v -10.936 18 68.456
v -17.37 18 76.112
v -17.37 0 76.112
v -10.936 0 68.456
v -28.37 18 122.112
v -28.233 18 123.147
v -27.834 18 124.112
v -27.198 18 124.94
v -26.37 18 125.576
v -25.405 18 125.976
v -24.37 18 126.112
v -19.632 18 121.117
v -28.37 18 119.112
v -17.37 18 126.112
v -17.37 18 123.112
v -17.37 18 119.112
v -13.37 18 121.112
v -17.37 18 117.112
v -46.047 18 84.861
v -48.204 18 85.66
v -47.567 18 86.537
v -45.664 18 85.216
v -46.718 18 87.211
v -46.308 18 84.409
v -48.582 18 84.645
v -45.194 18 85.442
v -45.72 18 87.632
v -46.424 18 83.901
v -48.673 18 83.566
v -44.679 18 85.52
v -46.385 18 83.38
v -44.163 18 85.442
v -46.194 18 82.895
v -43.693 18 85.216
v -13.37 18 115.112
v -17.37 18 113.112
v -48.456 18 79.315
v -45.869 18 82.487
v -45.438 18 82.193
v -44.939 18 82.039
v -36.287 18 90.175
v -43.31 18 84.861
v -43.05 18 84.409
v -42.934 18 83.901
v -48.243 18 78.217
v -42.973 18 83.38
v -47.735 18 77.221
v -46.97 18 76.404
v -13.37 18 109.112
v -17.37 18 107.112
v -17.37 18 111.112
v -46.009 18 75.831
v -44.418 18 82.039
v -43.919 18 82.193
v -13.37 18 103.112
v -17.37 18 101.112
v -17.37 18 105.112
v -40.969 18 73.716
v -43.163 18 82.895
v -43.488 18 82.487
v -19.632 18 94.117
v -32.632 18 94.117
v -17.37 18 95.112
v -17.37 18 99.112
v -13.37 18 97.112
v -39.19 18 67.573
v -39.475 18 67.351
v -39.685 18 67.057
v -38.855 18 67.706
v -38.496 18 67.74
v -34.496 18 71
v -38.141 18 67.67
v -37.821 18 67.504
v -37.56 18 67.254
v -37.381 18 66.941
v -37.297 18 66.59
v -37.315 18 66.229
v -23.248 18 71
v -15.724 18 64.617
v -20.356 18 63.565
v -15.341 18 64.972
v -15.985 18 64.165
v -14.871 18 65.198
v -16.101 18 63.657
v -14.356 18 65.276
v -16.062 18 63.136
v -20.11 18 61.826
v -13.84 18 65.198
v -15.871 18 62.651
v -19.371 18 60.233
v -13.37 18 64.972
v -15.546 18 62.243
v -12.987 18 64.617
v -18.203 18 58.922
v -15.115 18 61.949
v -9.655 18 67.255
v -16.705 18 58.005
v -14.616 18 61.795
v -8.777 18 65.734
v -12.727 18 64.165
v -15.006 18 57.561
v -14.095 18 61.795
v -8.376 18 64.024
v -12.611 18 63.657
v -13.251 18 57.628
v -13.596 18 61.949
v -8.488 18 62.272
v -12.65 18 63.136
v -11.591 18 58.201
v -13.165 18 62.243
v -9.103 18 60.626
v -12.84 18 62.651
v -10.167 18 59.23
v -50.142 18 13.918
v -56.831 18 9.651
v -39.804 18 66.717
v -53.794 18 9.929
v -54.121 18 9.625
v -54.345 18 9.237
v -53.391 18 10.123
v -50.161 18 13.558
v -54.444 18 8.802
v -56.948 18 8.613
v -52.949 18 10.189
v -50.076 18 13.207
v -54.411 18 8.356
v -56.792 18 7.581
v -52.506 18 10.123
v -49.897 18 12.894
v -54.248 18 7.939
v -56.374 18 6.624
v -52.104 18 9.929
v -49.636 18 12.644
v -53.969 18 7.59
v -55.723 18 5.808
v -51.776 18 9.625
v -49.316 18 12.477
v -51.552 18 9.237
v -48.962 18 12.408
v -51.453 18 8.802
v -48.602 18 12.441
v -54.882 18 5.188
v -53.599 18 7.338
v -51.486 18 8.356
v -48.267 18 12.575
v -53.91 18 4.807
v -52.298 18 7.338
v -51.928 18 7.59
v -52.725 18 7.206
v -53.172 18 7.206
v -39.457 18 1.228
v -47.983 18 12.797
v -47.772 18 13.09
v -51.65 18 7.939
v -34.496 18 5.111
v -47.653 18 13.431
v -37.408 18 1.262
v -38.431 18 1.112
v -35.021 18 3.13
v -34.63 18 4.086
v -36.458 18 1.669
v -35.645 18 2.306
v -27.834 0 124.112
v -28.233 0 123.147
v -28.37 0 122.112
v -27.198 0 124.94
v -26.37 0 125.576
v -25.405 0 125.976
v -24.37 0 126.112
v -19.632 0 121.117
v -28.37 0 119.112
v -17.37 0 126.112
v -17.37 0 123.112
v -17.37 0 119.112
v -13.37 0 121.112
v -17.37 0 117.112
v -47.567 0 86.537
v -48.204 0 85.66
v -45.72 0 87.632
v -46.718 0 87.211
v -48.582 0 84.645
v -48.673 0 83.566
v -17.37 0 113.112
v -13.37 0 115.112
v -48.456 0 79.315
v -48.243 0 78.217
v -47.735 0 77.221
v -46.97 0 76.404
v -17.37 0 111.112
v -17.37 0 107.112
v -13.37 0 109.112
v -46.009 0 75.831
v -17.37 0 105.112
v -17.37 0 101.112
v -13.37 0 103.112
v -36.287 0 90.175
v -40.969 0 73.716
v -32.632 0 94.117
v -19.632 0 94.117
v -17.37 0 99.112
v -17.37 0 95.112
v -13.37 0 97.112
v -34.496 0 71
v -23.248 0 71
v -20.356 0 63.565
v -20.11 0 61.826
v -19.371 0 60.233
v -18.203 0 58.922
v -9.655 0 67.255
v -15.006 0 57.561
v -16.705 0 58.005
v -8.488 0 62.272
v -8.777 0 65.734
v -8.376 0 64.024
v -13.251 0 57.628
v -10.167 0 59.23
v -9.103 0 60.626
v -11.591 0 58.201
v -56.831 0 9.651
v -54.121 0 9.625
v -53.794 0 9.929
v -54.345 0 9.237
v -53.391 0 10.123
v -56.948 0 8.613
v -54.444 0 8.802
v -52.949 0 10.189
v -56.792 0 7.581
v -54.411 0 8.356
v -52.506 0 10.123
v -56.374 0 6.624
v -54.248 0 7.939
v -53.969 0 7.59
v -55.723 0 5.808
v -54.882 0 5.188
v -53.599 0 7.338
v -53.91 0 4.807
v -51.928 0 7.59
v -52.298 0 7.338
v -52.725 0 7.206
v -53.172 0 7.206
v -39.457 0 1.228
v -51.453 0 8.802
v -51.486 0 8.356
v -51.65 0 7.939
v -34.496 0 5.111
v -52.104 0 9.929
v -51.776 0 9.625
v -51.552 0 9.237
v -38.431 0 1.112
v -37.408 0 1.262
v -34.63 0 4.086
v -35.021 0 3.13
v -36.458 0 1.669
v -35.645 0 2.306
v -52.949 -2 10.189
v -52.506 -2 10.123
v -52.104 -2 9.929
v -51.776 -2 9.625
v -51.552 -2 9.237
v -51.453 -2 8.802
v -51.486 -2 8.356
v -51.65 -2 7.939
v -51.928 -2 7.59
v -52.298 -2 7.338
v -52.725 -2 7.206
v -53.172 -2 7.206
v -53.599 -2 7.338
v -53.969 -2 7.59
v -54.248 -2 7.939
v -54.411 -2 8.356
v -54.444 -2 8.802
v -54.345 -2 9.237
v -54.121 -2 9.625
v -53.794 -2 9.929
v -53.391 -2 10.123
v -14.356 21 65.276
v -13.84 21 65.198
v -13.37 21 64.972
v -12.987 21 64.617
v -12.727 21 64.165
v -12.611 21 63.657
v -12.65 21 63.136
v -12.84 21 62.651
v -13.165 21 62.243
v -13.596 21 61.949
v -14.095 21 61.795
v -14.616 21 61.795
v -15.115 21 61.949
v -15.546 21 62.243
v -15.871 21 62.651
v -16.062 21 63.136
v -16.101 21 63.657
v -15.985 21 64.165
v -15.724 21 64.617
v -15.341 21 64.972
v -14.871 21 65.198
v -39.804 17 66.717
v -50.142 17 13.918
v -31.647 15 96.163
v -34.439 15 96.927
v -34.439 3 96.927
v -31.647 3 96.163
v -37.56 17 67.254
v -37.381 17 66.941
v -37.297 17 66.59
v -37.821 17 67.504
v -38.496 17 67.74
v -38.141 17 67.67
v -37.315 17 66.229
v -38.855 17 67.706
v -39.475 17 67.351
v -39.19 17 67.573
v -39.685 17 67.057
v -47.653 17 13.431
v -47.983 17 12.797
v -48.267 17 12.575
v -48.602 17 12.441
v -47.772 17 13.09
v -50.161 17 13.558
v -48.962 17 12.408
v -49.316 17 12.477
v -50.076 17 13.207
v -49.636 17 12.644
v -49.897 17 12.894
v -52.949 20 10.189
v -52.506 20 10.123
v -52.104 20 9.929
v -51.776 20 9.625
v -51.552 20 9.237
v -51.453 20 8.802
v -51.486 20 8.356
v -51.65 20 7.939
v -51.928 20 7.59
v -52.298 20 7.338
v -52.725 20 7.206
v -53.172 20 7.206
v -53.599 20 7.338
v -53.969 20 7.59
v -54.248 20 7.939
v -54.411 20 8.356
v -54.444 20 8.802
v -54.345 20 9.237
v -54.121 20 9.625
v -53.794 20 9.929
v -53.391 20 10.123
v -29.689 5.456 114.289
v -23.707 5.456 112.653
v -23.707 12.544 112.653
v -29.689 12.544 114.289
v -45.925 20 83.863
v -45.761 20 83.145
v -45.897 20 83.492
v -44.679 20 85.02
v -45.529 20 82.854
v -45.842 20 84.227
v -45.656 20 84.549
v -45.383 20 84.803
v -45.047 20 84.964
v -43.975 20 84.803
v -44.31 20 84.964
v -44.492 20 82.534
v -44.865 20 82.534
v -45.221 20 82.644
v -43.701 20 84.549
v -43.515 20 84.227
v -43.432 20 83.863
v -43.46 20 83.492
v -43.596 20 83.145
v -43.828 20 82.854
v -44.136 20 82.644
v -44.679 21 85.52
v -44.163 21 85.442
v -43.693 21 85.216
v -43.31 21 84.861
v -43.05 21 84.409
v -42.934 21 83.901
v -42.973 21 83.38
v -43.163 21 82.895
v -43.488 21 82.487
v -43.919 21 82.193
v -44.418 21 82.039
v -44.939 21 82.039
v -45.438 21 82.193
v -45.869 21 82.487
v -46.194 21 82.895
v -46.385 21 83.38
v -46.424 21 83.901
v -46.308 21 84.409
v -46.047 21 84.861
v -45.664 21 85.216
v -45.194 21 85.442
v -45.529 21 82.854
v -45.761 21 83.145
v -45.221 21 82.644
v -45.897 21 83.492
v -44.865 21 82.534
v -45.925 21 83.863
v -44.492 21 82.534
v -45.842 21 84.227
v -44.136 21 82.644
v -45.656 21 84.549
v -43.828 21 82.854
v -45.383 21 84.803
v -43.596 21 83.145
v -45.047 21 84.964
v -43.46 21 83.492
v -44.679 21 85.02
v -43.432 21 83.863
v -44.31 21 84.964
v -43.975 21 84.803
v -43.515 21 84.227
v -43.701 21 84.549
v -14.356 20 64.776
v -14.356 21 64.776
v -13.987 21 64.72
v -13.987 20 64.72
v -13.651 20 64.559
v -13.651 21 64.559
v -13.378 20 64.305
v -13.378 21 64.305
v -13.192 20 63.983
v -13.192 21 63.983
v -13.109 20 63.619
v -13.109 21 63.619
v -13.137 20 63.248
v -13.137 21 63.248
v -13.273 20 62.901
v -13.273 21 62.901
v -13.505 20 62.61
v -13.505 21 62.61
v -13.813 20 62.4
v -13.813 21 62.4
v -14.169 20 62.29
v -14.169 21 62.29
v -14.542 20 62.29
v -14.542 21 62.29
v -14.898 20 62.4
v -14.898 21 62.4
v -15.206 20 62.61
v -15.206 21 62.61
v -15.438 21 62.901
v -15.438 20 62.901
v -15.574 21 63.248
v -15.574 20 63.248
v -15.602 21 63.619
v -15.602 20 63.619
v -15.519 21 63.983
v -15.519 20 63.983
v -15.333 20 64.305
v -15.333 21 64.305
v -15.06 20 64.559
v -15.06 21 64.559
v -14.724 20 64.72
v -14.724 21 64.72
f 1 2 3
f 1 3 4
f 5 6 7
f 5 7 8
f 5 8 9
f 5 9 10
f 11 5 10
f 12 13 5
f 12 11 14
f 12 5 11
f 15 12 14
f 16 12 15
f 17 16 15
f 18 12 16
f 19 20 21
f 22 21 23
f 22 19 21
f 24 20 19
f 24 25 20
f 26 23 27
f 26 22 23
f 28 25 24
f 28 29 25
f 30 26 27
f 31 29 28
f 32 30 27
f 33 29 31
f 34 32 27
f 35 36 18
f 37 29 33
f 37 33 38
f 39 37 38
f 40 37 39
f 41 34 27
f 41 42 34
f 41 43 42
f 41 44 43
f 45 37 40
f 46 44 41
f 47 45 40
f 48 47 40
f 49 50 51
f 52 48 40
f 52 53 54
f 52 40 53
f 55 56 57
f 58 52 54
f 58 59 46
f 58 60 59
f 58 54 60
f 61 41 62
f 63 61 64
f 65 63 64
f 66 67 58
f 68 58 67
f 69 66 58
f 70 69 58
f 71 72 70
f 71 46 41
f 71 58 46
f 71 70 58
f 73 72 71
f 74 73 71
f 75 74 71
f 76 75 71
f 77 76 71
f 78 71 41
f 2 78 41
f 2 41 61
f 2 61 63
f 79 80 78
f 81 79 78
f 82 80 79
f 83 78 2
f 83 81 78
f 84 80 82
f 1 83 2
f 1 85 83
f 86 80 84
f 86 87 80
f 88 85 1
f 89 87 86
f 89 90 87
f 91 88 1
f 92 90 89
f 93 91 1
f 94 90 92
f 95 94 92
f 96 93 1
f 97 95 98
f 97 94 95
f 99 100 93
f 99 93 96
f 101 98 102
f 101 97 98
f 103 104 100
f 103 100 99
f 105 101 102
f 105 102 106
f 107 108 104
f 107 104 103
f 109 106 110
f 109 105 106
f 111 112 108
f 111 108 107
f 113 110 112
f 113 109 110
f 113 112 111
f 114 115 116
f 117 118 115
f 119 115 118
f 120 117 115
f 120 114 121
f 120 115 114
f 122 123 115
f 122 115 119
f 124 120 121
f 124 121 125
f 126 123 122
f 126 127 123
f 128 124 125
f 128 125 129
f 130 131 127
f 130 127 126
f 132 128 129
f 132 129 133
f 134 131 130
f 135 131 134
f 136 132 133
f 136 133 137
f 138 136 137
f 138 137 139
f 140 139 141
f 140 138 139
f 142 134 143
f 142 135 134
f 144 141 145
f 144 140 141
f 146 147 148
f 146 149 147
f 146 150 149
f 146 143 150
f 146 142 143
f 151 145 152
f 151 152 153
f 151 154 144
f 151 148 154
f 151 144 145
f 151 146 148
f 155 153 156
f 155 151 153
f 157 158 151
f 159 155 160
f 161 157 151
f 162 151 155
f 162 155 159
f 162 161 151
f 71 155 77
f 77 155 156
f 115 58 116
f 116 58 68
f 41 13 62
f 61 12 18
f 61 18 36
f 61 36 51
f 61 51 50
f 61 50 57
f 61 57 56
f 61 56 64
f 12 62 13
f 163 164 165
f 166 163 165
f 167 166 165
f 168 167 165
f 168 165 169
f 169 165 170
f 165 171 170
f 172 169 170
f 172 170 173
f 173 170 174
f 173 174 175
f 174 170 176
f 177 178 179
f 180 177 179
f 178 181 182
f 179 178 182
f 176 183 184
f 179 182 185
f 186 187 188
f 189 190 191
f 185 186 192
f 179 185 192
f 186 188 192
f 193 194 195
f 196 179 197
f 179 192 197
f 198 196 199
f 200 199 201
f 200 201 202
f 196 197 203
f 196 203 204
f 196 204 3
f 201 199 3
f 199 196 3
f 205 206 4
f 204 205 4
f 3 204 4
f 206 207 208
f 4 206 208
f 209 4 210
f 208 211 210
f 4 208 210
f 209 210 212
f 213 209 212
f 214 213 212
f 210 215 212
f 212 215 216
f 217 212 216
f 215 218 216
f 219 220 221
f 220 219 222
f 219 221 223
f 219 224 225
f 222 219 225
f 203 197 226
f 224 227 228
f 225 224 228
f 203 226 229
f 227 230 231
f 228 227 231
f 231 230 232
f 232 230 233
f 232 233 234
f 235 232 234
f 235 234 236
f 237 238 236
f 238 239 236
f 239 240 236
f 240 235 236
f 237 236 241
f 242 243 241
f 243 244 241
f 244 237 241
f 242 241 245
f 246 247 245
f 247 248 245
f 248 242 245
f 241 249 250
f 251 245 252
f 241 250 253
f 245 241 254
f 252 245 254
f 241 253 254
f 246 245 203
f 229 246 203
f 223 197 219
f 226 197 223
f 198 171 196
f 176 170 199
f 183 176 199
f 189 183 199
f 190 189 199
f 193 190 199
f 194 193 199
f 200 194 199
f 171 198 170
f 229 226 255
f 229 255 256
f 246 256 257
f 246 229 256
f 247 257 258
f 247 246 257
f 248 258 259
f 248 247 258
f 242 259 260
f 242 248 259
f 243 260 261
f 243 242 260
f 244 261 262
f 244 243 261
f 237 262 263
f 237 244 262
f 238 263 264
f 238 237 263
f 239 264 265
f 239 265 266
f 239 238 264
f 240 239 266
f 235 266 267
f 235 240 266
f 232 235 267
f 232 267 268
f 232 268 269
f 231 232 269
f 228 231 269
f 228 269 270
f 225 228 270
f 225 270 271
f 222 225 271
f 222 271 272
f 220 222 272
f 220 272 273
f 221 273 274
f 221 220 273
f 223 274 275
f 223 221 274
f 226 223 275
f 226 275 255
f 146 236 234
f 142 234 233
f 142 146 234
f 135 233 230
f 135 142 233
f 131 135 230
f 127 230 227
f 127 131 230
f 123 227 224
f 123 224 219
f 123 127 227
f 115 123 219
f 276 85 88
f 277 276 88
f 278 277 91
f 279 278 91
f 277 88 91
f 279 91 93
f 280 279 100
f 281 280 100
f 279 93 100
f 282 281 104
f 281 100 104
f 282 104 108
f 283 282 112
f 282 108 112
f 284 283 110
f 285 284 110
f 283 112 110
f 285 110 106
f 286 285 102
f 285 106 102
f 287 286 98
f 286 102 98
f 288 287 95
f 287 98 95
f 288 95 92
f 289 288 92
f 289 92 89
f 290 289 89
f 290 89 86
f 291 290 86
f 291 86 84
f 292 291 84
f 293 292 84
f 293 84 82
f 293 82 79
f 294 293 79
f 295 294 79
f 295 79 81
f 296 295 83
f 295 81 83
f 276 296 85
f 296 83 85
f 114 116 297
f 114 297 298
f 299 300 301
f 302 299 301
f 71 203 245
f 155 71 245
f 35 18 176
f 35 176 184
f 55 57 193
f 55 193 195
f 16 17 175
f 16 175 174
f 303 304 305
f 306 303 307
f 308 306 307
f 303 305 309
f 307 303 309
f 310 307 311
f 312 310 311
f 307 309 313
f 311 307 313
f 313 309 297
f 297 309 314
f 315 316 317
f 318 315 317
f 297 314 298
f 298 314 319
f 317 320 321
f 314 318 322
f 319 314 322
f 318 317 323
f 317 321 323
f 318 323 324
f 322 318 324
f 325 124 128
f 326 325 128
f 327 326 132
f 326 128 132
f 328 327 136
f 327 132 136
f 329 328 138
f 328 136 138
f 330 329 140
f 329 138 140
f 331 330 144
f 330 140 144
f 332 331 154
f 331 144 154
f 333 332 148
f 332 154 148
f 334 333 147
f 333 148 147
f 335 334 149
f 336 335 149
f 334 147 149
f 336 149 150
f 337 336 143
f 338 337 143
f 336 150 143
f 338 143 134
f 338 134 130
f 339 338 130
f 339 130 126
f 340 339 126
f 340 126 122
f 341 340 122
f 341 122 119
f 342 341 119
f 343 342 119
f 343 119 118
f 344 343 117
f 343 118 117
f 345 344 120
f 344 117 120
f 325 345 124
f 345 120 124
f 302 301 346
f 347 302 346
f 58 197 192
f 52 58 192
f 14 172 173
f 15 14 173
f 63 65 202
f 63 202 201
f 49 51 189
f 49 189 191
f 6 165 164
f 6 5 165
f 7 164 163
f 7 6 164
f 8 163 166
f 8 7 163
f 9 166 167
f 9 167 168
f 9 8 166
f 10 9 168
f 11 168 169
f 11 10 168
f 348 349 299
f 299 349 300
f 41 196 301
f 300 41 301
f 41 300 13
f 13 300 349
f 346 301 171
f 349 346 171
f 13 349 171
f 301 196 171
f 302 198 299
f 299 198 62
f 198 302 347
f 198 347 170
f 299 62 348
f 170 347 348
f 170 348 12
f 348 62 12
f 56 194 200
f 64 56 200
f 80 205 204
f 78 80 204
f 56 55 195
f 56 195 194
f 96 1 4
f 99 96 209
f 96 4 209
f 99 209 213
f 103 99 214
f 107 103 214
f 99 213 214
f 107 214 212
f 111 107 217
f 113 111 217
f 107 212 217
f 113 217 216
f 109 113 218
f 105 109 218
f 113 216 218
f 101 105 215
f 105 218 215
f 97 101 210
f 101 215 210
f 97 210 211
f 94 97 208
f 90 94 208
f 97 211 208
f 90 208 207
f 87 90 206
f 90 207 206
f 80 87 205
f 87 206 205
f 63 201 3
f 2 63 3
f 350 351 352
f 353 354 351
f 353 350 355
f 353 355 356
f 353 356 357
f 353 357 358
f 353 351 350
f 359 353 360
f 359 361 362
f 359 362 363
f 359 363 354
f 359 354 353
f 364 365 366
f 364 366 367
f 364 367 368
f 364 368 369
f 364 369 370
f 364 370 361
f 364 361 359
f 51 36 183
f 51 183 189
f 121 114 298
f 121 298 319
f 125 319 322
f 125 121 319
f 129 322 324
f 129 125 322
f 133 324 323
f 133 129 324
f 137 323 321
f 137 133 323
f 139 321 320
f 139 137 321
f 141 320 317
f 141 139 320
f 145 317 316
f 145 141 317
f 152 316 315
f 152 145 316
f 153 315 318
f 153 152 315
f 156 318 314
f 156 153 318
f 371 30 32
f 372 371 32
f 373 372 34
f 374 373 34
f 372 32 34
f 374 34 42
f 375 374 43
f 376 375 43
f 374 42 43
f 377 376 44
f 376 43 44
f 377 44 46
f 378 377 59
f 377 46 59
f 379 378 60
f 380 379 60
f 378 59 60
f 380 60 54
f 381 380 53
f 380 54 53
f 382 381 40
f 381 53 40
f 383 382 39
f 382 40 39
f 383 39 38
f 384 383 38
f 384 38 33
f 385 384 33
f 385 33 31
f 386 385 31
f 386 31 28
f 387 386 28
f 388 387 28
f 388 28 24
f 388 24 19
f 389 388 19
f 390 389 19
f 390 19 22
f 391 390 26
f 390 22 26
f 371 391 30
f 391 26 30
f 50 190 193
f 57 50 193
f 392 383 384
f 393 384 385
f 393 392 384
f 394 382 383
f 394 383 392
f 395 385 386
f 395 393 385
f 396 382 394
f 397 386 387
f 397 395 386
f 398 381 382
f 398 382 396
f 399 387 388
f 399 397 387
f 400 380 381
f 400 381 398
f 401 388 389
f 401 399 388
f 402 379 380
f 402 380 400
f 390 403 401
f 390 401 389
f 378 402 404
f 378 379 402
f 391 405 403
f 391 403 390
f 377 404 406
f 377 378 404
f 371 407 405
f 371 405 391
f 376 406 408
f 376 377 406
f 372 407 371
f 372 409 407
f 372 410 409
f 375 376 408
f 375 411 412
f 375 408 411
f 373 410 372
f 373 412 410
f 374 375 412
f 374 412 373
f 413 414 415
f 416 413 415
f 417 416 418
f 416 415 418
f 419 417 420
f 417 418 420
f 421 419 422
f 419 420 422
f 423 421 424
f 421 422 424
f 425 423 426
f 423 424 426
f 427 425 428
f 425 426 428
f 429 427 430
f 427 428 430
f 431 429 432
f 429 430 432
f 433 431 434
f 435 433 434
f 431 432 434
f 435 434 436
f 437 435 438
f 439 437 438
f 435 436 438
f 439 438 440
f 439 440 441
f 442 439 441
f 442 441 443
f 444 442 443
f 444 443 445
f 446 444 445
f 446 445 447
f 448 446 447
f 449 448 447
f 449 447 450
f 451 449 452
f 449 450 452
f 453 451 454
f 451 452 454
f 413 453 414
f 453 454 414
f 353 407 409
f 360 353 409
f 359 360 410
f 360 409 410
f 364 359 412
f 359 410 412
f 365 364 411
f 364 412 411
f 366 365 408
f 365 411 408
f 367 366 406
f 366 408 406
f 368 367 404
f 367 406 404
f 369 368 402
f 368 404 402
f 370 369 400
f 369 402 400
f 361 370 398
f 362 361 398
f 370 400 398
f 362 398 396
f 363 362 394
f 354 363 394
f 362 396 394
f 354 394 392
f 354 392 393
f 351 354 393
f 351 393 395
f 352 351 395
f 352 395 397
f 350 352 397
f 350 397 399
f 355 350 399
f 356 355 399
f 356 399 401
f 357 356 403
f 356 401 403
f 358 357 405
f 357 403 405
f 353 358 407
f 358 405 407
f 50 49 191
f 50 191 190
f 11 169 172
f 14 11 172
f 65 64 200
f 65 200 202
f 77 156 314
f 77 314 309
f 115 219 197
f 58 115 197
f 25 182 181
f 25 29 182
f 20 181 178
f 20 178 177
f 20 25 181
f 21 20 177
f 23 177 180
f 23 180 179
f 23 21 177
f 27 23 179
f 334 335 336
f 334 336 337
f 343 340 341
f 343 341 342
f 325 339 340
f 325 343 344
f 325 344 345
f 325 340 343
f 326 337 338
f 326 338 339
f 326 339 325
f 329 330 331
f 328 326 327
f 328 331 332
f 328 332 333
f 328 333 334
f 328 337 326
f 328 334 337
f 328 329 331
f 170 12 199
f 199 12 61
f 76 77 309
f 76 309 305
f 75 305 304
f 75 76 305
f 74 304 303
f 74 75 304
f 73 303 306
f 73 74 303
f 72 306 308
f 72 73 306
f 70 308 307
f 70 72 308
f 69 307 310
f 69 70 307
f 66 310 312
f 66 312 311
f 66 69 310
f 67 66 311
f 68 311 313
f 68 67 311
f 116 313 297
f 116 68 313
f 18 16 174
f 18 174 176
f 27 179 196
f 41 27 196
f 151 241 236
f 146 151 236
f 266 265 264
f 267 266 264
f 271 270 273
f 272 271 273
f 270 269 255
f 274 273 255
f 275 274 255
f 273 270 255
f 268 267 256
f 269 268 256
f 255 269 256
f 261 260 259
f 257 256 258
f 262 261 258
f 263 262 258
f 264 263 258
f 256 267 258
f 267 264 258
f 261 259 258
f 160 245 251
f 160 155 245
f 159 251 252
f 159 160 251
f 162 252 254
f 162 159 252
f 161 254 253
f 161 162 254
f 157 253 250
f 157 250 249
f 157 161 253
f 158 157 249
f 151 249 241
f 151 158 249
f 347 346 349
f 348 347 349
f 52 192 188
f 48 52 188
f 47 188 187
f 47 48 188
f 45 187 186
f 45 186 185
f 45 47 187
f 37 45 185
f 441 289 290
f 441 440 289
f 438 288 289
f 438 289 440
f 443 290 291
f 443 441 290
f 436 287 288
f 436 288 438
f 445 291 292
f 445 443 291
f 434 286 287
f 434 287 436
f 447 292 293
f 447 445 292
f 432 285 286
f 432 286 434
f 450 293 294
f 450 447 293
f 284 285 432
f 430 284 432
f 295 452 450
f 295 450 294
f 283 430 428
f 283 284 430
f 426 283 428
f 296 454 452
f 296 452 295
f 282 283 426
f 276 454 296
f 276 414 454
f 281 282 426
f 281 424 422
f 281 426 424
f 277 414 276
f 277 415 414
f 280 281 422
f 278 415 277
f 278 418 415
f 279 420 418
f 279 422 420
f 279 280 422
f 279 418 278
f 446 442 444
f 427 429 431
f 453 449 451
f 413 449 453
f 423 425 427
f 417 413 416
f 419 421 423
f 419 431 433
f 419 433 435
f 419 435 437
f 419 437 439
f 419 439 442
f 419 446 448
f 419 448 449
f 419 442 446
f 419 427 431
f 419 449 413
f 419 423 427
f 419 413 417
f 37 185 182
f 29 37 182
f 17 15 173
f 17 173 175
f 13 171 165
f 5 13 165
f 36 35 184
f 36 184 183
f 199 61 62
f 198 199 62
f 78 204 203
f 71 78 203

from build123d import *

# Parameters (mm, degrees)
BOSS_EXTRUDE1_DEPTH = 18
FILLET2_R           = 4
BOSS_EXTRUDE2_DEPTH = 18
LPATTERN1_COUNT     = 5
LPATTERN1_PITCH     = 6
CUT_EXTRUDE1_DEPTH  = 26
CUT_EXTRUDE2_DEPTH  = 8
SKETCH6_R           = 1.75
BOSS_EXTRUDE3_DEPTH = 3
SKETCH7_R           = 1.25
CUT_EXTRUDE4_DEPTH  = 1
SKETCH8_R           = 1.25
CUT_EXTRUDE5_DEPTH  = 1
CUT_EXTRUDE6_DEPTH  = 1
SKETCH5_R           = 1.5
BOSS_EXTRUDE4_DEPTH = 2


with BuildPart() as part:
    # Sketch1 → Boss-Extrude1 (new body)
    with BuildSketch(Plane(origin=(0, 0, 0), x_dir=(1, 0, 0), z_dir=(0, 1, 0))):
        Polygon((-40.969304311, -73.71633288), (-34.496108293, -71), (-34.496108293, 0), (-57.792675156, -5.768012861), align=None)
        with BuildLine():
            Line((-23.247974987, -71), (-34.496108293, -71))
            Line((-34.496108293, -71), (-40.969304311, -73.71633288))
            Line((-40.969304311, -73.71633288), (-48.327677264, -76.804110593))
            Line((-48.327677264, -76.804110593), (-48.838396363, -86.791060378))
            Line((-48.838396363, -86.791060378), (-36.286676362, -90.175484262))
            Line((-36.286676362, -90.175484262), (-28.369724317, -119.111998743))
            Line((-28.369724317, -119.111998743), (-28.369724317, -126.111998743))
            Line((-28.369724317, -126.111998743), (-17.369724317, -126.111998743))
            Line((-17.369724317, -126.111998743), (-17.369724317, -76.111998743))
            Line((-17.369724317, -76.111998743), (-10.936329958, -68.456188073))
            ThreePointArc((-10.936329958, -68.456188073), (-11.590696078, -58.200883887), (-20.355503093, -63.56536121))
            Line((-20.355503093, -63.56536121), (-23.247974987, -71))
        make_face()
    extrude(amount=BOSS_EXTRUDE1_DEPTH)

    # Fillet2
    fillet2_edges = [part.edges().sort_by_distance(p)[0] for p in [
        (-57.792675156, 9, 5.768012861),
        (-34.496108293, 9, 0),
        (-28.369724317, 9, 126.111998743),
        (-48.838396363, 9, 86.791060378),
        (-48.327677264, 9, 76.804110593),
    ]]
    fillet(fillet2_edges, radius=FILLET2_R)

    # Sketch2 → Boss-Extrude2 (add, through all)
    with BuildSketch(Plane(origin=(0, 18, 0), x_dir=(1, 0, 0), z_dir=(0, 1, 0))):
        Polygon((-17.369724317, -119.111998743), (-17.369724317, -123.111998743), (-13.369724317, -121.111998743), align=None)
    boss_extrude2 = extrude(amount=-BOSS_EXTRUDE2_DEPTH)

    # LPattern1: Boss-Extrude2 ×5
    with Locations(*[(0, 0, -i * LPATTERN1_PITCH) for i in range(1, LPATTERN1_COUNT)]):
        add(boss_extrude2)

    # Sketch3 → Cut-Extrude1 (cut)
    with BuildSketch(Plane(origin=(0, 18, 0), x_dir=(1, 0, 0), z_dir=(0, 1, 0))):
        Polygon((-19.631839037, -121.116880753), (-19.631839037, -94.116880753), (-32.631839037, -94.116880753), align=None)
    extrude(amount=-CUT_EXTRUDE1_DEPTH, mode=Mode.SUBTRACT)

    # Sketch4 → Cut-Extrude2 (cut)
    with BuildSketch(Plane(origin=(-56.713154452, 0, 15.516565563), x_dir=(0.2638984014912162, 0, 0.9645504827070385), z_dir=(-0.9645504827070386, 0, 0.2638984014912162))):
        Polygon((84.402810986, 15), (84.402810986, 3), (102.402810986, 5.456363489), (102.402810986, 12.543636511), align=None)
    extrude(amount=-CUT_EXTRUDE2_DEPTH, mode=Mode.SUBTRACT)

    # Sketch6 → Boss-Extrude3 (add)
    with BuildSketch(Plane(origin=(0, 18, 0), x_dir=(1, 0, 0), z_dir=(0, 1, 0))):
        with Locations(Location((-14.355633277, -63.525836684, 0), (0, 0, 270))):
            Circle(SKETCH6_R)
        with Locations(Location((-44.67866751, -83.769823901, 0), (0, 0, 270))):
            Circle(SKETCH6_R)
    extrude(amount=BOSS_EXTRUDE3_DEPTH)

    # Sketch7 → Cut-Extrude4 (cut)
    with BuildSketch(Plane(origin=(0, 21, 0), x_dir=(1, 0, 0), z_dir=(0, 1, 0))):
        with Locations(Location((-14.355633277, -63.525836684, 0), (0, 0, 270))):
            Circle(SKETCH7_R)
    extrude(amount=-CUT_EXTRUDE4_DEPTH, mode=Mode.SUBTRACT)

    # Sketch8 → Cut-Extrude5 (cut)
    with BuildSketch(Plane(origin=(0, 21, 0), x_dir=(1, 0, 0), z_dir=(0, 1, 0))):
        with Locations(Location((-44.67866751, -83.769823901, 0), (0, 0, 270))):
            Circle(SKETCH8_R)
    extrude(amount=-CUT_EXTRUDE5_DEPTH, mode=Mode.SUBTRACT)

    # Sketch9 → Cut-Extrude6 (cut)
    with BuildSketch(Plane(origin=(0, 18, 0), x_dir=(1, 0, 0), z_dir=(0, 1, 0))):
        with BuildLine():
            Line((-47.653198818, -13.430984589), (-37.315061162, -66.229330476))
            ThreePointArc((-37.315061162, -66.229330476), (-38.31592464, -67.717570951), (-39.804165115, -66.716707473))
            Line((-39.804165115, -66.716707473), (-50.142302771, -13.918361587))
            ThreePointArc((-50.142302771, -13.918361587), (-49.141439293, -12.430121111), (-47.653198818, -13.430984589))
        make_face()
    extrude(amount=-CUT_EXTRUDE6_DEPTH, mode=Mode.SUBTRACT)

    # Sketch5 → Boss-Extrude4 (add)
    with BuildSketch(Plane(origin=(0, 18, 0), x_dir=(1, 0, 0), z_dir=(0, 1, 0))):
        with Locations(Location((-52.948578536, -8.689438528, 0), (0, 0, 270))):
            Circle(SKETCH5_R)
    boss_extrude4 = extrude(amount=BOSS_EXTRUDE4_DEPTH)

    # Mirror1: Boss-Extrude4 across plane
    add(boss_extrude4.mirror(Plane.ZX.offset(9)))


solid = part.part
